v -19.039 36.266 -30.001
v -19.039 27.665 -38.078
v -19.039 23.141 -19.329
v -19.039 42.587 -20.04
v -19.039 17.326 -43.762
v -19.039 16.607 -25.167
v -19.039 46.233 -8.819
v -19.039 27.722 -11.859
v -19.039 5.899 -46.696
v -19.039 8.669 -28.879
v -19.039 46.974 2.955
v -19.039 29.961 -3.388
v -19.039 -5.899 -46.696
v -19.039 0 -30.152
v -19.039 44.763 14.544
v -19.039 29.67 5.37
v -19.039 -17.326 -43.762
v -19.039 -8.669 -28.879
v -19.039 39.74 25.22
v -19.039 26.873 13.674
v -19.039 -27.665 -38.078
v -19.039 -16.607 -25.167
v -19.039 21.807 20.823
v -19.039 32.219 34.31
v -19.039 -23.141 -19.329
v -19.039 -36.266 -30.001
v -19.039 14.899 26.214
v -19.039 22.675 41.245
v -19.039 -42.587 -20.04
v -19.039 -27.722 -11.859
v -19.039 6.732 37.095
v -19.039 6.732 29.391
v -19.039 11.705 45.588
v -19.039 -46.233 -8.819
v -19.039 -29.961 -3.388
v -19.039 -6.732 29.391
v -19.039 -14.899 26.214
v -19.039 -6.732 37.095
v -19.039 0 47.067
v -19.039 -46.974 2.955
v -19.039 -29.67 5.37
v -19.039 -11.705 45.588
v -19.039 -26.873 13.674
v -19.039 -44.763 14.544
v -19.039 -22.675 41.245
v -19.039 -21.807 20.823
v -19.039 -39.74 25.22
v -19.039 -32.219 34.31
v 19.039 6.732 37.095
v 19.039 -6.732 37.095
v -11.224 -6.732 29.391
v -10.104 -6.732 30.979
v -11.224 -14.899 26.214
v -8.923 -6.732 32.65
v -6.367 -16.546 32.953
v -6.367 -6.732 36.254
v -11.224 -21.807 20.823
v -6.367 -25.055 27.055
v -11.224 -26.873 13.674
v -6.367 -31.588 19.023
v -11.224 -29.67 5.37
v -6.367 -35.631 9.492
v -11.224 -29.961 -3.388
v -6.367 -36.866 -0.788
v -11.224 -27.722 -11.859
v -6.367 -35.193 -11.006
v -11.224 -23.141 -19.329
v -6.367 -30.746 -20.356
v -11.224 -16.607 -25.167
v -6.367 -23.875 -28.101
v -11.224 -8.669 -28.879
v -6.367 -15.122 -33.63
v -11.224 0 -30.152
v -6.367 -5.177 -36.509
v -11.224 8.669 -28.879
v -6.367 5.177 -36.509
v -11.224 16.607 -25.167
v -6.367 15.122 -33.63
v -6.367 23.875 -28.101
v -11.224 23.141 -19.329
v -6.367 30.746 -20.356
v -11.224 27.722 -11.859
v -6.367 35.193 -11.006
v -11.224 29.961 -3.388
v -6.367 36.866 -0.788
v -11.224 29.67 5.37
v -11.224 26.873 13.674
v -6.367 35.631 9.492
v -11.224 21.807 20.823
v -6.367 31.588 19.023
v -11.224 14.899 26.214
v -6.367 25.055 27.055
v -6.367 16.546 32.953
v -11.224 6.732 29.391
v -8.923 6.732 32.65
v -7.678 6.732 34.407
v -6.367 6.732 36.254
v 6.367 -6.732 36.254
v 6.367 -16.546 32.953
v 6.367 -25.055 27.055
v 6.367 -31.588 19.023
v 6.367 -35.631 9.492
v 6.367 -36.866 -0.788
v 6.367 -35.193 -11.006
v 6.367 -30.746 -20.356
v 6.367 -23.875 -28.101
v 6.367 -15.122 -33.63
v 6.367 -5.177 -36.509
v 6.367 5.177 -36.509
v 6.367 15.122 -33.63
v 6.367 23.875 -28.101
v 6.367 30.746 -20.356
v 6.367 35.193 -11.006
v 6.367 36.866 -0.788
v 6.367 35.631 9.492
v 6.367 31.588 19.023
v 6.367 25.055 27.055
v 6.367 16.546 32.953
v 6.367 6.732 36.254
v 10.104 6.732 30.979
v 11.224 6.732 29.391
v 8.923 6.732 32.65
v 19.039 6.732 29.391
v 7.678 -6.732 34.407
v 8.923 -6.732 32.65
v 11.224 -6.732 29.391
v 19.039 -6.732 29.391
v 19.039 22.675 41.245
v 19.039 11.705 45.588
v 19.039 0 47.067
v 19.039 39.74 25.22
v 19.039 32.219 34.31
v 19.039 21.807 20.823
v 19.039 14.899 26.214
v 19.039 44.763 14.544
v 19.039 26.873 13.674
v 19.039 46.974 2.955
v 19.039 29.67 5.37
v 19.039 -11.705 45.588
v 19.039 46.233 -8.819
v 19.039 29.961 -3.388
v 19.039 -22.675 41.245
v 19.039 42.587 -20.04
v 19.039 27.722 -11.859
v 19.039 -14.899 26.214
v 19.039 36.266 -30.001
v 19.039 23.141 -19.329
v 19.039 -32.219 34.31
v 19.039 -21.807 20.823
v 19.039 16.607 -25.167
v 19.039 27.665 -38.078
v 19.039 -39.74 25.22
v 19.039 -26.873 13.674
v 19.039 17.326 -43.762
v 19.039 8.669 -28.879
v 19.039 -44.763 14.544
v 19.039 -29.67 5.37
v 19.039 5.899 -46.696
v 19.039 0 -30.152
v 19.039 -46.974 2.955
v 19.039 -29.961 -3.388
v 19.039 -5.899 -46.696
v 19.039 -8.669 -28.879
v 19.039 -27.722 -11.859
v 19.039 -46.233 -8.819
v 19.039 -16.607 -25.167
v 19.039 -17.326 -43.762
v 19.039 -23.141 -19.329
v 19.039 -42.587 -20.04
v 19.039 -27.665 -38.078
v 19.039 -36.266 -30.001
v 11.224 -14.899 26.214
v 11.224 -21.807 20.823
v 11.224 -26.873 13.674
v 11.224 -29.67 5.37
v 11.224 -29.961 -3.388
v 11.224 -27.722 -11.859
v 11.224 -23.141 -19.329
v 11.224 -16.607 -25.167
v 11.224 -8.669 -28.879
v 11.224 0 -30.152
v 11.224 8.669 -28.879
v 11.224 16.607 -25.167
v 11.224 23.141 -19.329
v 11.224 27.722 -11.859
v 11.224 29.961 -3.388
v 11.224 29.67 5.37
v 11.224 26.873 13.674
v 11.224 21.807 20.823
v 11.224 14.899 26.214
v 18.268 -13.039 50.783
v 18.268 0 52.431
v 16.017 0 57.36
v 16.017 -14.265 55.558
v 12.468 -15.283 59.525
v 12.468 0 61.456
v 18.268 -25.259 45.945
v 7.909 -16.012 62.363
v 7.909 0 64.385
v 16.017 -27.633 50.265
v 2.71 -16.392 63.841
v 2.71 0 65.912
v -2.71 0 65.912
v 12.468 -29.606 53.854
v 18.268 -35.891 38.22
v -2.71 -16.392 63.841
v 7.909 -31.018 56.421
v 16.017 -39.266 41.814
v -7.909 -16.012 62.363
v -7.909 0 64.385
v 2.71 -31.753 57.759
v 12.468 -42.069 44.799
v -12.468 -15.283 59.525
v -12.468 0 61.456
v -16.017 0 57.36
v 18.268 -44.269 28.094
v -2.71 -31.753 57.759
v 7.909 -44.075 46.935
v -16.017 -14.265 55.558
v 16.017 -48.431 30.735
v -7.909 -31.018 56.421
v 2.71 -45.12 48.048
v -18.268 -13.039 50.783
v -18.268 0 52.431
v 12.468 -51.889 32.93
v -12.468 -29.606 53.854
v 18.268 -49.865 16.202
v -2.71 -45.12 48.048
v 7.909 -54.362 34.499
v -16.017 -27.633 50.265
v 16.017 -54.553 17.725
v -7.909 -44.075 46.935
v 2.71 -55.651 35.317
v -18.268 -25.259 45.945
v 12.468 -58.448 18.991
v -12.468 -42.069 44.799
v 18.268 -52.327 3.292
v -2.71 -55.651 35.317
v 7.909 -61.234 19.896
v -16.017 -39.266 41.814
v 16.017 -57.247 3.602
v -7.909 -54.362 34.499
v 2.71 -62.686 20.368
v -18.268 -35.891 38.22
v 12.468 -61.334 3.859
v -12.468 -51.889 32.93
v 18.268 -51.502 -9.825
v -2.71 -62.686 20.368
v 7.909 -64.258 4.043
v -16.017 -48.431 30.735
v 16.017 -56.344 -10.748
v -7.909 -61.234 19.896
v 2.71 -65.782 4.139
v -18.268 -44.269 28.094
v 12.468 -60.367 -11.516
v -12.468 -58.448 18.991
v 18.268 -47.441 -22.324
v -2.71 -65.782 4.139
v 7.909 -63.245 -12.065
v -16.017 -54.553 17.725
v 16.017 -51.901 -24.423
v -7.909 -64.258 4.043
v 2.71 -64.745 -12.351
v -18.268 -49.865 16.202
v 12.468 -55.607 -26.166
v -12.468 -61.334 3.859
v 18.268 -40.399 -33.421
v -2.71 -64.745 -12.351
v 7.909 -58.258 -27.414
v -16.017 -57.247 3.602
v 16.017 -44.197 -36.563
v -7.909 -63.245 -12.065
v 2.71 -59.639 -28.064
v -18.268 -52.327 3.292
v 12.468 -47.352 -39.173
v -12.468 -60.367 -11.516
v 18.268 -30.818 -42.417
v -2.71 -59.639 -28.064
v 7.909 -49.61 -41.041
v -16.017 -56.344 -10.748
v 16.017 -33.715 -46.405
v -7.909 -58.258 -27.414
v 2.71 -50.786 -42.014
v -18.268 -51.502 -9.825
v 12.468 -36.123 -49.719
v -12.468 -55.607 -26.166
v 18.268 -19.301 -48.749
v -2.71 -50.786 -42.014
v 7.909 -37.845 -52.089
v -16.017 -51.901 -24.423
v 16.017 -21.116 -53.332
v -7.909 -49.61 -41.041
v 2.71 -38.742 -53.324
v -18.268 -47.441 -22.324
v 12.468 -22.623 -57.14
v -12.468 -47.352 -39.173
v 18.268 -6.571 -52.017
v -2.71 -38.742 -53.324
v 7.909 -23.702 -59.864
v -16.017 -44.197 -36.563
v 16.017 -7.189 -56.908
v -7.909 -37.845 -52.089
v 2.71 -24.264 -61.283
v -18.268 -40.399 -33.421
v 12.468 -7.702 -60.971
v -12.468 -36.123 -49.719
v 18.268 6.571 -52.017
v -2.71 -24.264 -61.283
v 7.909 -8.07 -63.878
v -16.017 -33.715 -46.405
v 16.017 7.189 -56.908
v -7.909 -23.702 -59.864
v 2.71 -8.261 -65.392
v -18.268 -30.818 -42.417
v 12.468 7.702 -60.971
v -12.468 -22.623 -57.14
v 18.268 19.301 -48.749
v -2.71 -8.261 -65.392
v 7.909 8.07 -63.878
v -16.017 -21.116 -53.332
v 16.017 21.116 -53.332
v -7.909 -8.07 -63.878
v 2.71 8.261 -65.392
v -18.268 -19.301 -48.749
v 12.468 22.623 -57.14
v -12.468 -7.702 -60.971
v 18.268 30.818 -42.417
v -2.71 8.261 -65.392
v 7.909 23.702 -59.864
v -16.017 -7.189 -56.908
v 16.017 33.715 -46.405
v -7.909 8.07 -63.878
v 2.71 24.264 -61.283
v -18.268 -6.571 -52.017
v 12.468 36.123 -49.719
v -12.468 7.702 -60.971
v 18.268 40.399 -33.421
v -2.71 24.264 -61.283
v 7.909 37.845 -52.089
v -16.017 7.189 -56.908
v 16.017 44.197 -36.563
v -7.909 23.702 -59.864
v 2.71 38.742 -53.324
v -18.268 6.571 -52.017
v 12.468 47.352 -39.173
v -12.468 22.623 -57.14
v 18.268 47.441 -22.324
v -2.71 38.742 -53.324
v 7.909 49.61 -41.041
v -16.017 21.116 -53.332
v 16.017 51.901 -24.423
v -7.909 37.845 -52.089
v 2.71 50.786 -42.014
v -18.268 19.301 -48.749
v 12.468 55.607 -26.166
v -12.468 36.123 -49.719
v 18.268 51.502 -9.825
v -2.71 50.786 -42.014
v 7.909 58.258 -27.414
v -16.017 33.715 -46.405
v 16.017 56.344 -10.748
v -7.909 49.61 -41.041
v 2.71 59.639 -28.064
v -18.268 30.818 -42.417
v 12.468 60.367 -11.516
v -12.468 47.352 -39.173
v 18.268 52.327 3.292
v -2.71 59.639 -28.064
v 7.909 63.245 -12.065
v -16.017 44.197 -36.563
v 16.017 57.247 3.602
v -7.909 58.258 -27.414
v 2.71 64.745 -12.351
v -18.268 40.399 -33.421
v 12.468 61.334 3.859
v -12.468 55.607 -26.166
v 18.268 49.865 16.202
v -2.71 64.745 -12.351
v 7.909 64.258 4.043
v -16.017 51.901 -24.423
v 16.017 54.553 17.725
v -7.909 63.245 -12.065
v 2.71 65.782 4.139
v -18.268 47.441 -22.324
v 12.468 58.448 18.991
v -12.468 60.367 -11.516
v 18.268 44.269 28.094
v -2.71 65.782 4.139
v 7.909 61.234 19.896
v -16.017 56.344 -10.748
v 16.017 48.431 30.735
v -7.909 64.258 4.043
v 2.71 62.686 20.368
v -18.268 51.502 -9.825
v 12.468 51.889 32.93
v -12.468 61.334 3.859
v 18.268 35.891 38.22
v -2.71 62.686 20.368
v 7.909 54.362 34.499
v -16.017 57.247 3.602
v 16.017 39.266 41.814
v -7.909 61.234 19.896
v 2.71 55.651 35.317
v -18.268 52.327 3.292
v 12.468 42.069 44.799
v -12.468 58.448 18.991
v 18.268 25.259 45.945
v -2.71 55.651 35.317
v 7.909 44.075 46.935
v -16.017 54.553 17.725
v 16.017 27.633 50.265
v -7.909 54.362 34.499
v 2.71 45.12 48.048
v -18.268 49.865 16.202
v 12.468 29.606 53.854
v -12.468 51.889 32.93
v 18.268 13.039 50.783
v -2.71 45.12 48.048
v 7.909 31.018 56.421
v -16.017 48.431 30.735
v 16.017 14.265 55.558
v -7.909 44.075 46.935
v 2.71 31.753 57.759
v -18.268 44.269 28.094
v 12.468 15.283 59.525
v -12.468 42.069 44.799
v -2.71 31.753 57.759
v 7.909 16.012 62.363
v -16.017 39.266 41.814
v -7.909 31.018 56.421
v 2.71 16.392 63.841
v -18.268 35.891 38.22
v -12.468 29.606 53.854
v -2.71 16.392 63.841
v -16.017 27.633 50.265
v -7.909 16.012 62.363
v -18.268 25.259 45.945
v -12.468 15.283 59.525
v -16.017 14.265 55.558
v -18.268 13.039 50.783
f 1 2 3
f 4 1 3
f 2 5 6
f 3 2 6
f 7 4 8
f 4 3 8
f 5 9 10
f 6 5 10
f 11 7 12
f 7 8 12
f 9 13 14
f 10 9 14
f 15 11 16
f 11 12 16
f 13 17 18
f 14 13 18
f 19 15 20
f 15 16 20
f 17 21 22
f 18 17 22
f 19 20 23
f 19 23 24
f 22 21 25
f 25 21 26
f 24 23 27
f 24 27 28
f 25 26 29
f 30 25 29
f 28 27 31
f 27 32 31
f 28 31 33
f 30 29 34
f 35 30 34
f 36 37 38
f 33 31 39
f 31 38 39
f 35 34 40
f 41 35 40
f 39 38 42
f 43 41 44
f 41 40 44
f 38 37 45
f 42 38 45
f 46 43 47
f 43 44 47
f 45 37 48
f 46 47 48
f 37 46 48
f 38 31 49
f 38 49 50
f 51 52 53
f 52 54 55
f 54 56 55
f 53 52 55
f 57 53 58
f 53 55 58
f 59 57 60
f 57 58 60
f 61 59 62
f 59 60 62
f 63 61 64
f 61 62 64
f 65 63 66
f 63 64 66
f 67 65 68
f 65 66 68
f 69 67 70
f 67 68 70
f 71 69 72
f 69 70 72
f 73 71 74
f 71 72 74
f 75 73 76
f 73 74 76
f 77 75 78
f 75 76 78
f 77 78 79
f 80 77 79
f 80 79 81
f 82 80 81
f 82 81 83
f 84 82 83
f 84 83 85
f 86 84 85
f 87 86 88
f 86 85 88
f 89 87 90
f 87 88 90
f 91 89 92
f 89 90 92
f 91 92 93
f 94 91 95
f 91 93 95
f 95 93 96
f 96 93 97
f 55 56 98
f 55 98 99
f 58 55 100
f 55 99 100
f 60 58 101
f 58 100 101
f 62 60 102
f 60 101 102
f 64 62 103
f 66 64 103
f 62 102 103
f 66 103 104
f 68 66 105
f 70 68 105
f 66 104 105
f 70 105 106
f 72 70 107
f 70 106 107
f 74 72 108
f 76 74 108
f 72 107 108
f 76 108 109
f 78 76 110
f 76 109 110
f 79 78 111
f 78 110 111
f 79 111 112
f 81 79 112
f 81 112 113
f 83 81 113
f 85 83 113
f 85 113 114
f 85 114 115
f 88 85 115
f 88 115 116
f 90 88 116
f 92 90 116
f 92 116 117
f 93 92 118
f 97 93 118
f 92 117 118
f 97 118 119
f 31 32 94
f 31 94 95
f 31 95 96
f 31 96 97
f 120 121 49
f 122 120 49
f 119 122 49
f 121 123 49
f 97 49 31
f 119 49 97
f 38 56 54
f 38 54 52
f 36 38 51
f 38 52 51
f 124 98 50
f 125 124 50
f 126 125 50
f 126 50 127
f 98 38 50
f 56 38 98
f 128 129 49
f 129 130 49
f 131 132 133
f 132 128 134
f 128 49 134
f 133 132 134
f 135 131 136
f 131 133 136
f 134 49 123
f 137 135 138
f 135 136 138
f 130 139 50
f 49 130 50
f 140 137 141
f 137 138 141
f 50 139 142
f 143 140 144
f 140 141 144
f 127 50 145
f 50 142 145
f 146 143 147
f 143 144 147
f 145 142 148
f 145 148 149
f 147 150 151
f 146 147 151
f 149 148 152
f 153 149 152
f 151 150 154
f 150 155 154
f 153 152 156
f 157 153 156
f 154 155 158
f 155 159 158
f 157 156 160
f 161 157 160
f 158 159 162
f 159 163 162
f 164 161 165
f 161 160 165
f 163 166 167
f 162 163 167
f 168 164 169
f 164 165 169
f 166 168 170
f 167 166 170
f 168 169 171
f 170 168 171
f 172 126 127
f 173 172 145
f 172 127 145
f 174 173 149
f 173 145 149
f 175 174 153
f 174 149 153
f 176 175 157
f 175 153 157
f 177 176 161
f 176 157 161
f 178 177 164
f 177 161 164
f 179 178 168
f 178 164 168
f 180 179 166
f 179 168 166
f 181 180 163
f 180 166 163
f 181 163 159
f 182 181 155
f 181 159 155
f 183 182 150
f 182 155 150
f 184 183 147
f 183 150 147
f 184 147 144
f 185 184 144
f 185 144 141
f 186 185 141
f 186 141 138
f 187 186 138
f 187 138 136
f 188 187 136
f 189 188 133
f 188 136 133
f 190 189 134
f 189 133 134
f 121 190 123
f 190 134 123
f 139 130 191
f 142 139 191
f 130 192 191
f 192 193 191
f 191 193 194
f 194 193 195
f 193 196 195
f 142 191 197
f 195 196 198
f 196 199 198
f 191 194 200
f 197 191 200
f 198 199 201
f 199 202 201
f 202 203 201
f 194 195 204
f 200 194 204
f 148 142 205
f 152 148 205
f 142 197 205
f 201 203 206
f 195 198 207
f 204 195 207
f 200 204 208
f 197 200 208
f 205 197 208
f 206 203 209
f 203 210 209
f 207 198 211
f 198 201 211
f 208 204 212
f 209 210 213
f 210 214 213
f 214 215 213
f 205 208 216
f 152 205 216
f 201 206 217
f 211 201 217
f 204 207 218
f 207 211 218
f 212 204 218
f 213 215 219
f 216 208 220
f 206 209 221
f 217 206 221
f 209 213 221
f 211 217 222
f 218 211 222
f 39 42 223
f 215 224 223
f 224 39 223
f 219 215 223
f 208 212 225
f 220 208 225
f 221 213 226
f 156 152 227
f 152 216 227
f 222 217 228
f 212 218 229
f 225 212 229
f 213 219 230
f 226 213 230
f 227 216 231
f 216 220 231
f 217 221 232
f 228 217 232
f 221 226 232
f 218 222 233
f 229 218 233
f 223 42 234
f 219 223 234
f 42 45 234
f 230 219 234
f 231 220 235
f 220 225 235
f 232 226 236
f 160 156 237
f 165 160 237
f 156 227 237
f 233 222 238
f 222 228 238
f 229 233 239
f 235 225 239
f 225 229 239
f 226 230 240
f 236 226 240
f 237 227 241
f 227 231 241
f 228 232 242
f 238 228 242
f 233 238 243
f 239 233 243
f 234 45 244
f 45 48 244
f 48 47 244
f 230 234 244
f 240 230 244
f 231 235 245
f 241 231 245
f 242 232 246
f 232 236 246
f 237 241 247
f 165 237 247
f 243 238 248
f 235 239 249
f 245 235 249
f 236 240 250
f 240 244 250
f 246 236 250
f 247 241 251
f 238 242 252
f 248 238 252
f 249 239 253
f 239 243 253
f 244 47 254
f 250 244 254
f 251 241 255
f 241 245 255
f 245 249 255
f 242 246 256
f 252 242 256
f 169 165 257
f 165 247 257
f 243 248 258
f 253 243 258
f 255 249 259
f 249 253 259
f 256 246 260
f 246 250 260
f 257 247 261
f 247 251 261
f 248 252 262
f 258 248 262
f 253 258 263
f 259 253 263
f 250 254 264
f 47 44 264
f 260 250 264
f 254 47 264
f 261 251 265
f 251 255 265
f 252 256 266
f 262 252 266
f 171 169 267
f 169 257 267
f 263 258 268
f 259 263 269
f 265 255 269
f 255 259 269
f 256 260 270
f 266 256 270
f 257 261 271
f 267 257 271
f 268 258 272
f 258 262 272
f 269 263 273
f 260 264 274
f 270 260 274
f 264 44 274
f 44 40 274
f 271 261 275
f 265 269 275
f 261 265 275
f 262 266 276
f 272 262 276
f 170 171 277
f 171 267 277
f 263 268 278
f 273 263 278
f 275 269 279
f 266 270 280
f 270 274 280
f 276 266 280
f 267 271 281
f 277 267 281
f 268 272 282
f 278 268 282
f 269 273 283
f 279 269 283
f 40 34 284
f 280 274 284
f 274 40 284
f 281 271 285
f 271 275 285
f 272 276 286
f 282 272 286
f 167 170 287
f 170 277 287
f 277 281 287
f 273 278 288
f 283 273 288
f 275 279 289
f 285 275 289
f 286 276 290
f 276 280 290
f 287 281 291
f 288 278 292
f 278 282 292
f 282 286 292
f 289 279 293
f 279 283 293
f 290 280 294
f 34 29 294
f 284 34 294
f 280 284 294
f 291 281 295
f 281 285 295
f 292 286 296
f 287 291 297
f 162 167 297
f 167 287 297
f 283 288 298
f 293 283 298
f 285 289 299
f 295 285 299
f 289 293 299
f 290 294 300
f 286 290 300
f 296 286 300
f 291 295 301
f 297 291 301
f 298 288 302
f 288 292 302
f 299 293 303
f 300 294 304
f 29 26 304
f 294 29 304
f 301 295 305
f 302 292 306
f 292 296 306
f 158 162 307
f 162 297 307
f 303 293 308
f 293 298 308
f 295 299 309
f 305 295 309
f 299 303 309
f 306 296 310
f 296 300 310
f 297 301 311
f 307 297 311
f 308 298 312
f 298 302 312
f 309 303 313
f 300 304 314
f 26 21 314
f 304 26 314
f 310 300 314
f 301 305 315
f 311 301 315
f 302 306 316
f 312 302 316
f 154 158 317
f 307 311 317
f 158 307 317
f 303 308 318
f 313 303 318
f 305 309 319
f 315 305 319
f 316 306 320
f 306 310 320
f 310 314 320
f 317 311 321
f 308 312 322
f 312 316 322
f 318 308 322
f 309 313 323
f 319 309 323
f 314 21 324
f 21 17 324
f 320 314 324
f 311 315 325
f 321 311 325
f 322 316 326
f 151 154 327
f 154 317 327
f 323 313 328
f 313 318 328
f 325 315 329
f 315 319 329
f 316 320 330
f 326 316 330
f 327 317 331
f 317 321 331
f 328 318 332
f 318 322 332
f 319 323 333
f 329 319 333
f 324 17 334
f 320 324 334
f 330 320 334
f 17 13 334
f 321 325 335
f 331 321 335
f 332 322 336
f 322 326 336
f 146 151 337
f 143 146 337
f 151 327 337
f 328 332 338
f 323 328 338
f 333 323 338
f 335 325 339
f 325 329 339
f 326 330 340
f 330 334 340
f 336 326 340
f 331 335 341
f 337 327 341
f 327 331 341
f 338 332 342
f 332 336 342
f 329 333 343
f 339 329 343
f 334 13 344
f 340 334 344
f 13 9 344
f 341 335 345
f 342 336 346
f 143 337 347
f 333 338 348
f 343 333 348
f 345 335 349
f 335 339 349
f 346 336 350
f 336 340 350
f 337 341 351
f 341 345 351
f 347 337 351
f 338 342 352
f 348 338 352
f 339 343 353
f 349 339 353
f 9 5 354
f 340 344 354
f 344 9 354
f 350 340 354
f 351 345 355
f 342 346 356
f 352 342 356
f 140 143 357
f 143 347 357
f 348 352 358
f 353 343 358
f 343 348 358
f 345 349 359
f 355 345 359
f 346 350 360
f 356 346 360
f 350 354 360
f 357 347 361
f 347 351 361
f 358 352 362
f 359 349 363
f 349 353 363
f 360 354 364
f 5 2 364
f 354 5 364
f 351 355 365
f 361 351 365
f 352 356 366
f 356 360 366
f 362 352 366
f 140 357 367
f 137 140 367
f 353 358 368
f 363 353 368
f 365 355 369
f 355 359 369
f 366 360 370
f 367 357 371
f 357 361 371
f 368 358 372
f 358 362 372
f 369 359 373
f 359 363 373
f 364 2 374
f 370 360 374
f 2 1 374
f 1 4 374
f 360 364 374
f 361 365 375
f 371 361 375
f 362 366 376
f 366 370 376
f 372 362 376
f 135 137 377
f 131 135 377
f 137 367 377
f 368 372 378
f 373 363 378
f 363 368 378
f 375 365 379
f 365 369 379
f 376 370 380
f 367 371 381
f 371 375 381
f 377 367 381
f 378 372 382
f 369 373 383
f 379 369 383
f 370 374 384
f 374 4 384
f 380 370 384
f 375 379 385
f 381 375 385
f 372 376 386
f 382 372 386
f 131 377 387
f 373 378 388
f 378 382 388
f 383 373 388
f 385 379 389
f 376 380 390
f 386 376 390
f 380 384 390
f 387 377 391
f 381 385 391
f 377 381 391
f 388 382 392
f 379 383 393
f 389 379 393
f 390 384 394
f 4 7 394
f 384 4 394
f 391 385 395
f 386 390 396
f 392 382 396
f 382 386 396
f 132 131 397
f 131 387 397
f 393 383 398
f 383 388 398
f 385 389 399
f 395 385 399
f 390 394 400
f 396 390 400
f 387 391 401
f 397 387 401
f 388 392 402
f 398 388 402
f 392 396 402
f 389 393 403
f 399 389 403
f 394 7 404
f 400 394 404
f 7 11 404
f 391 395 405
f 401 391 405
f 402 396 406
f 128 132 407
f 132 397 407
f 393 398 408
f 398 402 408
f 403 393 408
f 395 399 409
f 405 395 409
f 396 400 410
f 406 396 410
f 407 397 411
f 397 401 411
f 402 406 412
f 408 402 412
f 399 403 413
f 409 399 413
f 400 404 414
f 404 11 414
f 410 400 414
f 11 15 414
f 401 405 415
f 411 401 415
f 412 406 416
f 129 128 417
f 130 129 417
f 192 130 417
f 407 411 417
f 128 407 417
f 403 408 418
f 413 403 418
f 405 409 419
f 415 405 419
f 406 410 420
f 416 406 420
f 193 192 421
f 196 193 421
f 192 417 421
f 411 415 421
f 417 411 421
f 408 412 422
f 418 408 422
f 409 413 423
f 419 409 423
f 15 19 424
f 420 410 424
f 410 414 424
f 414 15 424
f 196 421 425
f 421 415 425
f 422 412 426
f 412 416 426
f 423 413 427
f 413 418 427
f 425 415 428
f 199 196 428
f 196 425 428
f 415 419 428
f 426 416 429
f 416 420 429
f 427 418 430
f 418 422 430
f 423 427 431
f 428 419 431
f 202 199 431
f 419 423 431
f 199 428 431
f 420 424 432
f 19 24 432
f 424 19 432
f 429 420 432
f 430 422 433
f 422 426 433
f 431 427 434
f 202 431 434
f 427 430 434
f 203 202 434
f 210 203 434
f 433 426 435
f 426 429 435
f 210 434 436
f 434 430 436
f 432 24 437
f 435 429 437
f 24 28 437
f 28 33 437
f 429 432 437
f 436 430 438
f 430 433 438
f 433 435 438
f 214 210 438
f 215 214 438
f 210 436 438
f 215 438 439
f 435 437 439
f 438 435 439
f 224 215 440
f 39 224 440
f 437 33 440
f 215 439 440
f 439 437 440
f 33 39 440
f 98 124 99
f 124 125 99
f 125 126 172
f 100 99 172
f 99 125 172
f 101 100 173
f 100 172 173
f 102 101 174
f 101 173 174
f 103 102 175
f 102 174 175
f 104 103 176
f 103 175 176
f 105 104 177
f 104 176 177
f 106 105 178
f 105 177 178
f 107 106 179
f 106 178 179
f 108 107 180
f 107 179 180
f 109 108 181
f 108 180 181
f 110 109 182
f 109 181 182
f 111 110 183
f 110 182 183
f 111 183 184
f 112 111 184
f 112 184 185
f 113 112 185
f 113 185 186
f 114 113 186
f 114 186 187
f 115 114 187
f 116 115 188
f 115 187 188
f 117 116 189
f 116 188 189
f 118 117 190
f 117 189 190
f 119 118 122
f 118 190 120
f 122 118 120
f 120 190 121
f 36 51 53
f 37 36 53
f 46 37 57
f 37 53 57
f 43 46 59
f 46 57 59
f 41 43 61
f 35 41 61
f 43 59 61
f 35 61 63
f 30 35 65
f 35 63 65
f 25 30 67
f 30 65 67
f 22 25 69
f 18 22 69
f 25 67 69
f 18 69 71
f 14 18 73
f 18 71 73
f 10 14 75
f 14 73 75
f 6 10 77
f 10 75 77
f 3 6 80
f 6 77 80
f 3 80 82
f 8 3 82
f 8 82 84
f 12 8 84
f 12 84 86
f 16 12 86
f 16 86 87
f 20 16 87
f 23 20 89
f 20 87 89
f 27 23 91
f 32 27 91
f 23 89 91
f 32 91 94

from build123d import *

# Parameters (mm, degrees)
F3_DEPTH = 38.079278


with BuildPart() as f1:
    # F0 (on Front) → F1 (revolve)
    with BuildSketch(Plane.XZ):
        with BuildLine():
            Line((11.224204, 30.1519), (19.039139, 30.1519))
            Line((19.039139, 30.1519), (19.039139, 47.066718))
            ThreePointArc((19.039139, 47.066718), (0, 66.105857), (-19.039139, 47.066718))
            Line((-19.039139, 47.066718), (-19.039139, 30.1519))
            Line((-19.039139, 30.1519), (-11.224204, 30.1519))
            Line((-11.224204, 30.1519), (-6.366854, 36.873989))
            Line((-6.366854, 36.873989), (6.366854, 36.873989))
            Line((6.366854, 36.873989), (11.224204, 30.1519))
        make_face()
    revolve(axis=Axis((-0.409778, 0, 0), (1, 0, 0)))

    # F2 (on face) → F3 (cut, through all)
    with BuildSketch(Plane.YZ.offset(19.039139)):
        with BuildLine():
            Line((-6.732479, 37.094571), (-6.732479, 29.390658))
            ThreePointArc((-6.732479, 29.390658), (0, 30.1519), (6.732479, 29.390658))
            Line((6.732479, 29.390658), (6.732479, 37.094571))
            Line((6.732479, 37.094571), (-6.732479, 37.094571))
        make_face()
    extrude(amount=-F3_DEPTH, mode=Mode.SUBTRACT)


solid = f1.part
